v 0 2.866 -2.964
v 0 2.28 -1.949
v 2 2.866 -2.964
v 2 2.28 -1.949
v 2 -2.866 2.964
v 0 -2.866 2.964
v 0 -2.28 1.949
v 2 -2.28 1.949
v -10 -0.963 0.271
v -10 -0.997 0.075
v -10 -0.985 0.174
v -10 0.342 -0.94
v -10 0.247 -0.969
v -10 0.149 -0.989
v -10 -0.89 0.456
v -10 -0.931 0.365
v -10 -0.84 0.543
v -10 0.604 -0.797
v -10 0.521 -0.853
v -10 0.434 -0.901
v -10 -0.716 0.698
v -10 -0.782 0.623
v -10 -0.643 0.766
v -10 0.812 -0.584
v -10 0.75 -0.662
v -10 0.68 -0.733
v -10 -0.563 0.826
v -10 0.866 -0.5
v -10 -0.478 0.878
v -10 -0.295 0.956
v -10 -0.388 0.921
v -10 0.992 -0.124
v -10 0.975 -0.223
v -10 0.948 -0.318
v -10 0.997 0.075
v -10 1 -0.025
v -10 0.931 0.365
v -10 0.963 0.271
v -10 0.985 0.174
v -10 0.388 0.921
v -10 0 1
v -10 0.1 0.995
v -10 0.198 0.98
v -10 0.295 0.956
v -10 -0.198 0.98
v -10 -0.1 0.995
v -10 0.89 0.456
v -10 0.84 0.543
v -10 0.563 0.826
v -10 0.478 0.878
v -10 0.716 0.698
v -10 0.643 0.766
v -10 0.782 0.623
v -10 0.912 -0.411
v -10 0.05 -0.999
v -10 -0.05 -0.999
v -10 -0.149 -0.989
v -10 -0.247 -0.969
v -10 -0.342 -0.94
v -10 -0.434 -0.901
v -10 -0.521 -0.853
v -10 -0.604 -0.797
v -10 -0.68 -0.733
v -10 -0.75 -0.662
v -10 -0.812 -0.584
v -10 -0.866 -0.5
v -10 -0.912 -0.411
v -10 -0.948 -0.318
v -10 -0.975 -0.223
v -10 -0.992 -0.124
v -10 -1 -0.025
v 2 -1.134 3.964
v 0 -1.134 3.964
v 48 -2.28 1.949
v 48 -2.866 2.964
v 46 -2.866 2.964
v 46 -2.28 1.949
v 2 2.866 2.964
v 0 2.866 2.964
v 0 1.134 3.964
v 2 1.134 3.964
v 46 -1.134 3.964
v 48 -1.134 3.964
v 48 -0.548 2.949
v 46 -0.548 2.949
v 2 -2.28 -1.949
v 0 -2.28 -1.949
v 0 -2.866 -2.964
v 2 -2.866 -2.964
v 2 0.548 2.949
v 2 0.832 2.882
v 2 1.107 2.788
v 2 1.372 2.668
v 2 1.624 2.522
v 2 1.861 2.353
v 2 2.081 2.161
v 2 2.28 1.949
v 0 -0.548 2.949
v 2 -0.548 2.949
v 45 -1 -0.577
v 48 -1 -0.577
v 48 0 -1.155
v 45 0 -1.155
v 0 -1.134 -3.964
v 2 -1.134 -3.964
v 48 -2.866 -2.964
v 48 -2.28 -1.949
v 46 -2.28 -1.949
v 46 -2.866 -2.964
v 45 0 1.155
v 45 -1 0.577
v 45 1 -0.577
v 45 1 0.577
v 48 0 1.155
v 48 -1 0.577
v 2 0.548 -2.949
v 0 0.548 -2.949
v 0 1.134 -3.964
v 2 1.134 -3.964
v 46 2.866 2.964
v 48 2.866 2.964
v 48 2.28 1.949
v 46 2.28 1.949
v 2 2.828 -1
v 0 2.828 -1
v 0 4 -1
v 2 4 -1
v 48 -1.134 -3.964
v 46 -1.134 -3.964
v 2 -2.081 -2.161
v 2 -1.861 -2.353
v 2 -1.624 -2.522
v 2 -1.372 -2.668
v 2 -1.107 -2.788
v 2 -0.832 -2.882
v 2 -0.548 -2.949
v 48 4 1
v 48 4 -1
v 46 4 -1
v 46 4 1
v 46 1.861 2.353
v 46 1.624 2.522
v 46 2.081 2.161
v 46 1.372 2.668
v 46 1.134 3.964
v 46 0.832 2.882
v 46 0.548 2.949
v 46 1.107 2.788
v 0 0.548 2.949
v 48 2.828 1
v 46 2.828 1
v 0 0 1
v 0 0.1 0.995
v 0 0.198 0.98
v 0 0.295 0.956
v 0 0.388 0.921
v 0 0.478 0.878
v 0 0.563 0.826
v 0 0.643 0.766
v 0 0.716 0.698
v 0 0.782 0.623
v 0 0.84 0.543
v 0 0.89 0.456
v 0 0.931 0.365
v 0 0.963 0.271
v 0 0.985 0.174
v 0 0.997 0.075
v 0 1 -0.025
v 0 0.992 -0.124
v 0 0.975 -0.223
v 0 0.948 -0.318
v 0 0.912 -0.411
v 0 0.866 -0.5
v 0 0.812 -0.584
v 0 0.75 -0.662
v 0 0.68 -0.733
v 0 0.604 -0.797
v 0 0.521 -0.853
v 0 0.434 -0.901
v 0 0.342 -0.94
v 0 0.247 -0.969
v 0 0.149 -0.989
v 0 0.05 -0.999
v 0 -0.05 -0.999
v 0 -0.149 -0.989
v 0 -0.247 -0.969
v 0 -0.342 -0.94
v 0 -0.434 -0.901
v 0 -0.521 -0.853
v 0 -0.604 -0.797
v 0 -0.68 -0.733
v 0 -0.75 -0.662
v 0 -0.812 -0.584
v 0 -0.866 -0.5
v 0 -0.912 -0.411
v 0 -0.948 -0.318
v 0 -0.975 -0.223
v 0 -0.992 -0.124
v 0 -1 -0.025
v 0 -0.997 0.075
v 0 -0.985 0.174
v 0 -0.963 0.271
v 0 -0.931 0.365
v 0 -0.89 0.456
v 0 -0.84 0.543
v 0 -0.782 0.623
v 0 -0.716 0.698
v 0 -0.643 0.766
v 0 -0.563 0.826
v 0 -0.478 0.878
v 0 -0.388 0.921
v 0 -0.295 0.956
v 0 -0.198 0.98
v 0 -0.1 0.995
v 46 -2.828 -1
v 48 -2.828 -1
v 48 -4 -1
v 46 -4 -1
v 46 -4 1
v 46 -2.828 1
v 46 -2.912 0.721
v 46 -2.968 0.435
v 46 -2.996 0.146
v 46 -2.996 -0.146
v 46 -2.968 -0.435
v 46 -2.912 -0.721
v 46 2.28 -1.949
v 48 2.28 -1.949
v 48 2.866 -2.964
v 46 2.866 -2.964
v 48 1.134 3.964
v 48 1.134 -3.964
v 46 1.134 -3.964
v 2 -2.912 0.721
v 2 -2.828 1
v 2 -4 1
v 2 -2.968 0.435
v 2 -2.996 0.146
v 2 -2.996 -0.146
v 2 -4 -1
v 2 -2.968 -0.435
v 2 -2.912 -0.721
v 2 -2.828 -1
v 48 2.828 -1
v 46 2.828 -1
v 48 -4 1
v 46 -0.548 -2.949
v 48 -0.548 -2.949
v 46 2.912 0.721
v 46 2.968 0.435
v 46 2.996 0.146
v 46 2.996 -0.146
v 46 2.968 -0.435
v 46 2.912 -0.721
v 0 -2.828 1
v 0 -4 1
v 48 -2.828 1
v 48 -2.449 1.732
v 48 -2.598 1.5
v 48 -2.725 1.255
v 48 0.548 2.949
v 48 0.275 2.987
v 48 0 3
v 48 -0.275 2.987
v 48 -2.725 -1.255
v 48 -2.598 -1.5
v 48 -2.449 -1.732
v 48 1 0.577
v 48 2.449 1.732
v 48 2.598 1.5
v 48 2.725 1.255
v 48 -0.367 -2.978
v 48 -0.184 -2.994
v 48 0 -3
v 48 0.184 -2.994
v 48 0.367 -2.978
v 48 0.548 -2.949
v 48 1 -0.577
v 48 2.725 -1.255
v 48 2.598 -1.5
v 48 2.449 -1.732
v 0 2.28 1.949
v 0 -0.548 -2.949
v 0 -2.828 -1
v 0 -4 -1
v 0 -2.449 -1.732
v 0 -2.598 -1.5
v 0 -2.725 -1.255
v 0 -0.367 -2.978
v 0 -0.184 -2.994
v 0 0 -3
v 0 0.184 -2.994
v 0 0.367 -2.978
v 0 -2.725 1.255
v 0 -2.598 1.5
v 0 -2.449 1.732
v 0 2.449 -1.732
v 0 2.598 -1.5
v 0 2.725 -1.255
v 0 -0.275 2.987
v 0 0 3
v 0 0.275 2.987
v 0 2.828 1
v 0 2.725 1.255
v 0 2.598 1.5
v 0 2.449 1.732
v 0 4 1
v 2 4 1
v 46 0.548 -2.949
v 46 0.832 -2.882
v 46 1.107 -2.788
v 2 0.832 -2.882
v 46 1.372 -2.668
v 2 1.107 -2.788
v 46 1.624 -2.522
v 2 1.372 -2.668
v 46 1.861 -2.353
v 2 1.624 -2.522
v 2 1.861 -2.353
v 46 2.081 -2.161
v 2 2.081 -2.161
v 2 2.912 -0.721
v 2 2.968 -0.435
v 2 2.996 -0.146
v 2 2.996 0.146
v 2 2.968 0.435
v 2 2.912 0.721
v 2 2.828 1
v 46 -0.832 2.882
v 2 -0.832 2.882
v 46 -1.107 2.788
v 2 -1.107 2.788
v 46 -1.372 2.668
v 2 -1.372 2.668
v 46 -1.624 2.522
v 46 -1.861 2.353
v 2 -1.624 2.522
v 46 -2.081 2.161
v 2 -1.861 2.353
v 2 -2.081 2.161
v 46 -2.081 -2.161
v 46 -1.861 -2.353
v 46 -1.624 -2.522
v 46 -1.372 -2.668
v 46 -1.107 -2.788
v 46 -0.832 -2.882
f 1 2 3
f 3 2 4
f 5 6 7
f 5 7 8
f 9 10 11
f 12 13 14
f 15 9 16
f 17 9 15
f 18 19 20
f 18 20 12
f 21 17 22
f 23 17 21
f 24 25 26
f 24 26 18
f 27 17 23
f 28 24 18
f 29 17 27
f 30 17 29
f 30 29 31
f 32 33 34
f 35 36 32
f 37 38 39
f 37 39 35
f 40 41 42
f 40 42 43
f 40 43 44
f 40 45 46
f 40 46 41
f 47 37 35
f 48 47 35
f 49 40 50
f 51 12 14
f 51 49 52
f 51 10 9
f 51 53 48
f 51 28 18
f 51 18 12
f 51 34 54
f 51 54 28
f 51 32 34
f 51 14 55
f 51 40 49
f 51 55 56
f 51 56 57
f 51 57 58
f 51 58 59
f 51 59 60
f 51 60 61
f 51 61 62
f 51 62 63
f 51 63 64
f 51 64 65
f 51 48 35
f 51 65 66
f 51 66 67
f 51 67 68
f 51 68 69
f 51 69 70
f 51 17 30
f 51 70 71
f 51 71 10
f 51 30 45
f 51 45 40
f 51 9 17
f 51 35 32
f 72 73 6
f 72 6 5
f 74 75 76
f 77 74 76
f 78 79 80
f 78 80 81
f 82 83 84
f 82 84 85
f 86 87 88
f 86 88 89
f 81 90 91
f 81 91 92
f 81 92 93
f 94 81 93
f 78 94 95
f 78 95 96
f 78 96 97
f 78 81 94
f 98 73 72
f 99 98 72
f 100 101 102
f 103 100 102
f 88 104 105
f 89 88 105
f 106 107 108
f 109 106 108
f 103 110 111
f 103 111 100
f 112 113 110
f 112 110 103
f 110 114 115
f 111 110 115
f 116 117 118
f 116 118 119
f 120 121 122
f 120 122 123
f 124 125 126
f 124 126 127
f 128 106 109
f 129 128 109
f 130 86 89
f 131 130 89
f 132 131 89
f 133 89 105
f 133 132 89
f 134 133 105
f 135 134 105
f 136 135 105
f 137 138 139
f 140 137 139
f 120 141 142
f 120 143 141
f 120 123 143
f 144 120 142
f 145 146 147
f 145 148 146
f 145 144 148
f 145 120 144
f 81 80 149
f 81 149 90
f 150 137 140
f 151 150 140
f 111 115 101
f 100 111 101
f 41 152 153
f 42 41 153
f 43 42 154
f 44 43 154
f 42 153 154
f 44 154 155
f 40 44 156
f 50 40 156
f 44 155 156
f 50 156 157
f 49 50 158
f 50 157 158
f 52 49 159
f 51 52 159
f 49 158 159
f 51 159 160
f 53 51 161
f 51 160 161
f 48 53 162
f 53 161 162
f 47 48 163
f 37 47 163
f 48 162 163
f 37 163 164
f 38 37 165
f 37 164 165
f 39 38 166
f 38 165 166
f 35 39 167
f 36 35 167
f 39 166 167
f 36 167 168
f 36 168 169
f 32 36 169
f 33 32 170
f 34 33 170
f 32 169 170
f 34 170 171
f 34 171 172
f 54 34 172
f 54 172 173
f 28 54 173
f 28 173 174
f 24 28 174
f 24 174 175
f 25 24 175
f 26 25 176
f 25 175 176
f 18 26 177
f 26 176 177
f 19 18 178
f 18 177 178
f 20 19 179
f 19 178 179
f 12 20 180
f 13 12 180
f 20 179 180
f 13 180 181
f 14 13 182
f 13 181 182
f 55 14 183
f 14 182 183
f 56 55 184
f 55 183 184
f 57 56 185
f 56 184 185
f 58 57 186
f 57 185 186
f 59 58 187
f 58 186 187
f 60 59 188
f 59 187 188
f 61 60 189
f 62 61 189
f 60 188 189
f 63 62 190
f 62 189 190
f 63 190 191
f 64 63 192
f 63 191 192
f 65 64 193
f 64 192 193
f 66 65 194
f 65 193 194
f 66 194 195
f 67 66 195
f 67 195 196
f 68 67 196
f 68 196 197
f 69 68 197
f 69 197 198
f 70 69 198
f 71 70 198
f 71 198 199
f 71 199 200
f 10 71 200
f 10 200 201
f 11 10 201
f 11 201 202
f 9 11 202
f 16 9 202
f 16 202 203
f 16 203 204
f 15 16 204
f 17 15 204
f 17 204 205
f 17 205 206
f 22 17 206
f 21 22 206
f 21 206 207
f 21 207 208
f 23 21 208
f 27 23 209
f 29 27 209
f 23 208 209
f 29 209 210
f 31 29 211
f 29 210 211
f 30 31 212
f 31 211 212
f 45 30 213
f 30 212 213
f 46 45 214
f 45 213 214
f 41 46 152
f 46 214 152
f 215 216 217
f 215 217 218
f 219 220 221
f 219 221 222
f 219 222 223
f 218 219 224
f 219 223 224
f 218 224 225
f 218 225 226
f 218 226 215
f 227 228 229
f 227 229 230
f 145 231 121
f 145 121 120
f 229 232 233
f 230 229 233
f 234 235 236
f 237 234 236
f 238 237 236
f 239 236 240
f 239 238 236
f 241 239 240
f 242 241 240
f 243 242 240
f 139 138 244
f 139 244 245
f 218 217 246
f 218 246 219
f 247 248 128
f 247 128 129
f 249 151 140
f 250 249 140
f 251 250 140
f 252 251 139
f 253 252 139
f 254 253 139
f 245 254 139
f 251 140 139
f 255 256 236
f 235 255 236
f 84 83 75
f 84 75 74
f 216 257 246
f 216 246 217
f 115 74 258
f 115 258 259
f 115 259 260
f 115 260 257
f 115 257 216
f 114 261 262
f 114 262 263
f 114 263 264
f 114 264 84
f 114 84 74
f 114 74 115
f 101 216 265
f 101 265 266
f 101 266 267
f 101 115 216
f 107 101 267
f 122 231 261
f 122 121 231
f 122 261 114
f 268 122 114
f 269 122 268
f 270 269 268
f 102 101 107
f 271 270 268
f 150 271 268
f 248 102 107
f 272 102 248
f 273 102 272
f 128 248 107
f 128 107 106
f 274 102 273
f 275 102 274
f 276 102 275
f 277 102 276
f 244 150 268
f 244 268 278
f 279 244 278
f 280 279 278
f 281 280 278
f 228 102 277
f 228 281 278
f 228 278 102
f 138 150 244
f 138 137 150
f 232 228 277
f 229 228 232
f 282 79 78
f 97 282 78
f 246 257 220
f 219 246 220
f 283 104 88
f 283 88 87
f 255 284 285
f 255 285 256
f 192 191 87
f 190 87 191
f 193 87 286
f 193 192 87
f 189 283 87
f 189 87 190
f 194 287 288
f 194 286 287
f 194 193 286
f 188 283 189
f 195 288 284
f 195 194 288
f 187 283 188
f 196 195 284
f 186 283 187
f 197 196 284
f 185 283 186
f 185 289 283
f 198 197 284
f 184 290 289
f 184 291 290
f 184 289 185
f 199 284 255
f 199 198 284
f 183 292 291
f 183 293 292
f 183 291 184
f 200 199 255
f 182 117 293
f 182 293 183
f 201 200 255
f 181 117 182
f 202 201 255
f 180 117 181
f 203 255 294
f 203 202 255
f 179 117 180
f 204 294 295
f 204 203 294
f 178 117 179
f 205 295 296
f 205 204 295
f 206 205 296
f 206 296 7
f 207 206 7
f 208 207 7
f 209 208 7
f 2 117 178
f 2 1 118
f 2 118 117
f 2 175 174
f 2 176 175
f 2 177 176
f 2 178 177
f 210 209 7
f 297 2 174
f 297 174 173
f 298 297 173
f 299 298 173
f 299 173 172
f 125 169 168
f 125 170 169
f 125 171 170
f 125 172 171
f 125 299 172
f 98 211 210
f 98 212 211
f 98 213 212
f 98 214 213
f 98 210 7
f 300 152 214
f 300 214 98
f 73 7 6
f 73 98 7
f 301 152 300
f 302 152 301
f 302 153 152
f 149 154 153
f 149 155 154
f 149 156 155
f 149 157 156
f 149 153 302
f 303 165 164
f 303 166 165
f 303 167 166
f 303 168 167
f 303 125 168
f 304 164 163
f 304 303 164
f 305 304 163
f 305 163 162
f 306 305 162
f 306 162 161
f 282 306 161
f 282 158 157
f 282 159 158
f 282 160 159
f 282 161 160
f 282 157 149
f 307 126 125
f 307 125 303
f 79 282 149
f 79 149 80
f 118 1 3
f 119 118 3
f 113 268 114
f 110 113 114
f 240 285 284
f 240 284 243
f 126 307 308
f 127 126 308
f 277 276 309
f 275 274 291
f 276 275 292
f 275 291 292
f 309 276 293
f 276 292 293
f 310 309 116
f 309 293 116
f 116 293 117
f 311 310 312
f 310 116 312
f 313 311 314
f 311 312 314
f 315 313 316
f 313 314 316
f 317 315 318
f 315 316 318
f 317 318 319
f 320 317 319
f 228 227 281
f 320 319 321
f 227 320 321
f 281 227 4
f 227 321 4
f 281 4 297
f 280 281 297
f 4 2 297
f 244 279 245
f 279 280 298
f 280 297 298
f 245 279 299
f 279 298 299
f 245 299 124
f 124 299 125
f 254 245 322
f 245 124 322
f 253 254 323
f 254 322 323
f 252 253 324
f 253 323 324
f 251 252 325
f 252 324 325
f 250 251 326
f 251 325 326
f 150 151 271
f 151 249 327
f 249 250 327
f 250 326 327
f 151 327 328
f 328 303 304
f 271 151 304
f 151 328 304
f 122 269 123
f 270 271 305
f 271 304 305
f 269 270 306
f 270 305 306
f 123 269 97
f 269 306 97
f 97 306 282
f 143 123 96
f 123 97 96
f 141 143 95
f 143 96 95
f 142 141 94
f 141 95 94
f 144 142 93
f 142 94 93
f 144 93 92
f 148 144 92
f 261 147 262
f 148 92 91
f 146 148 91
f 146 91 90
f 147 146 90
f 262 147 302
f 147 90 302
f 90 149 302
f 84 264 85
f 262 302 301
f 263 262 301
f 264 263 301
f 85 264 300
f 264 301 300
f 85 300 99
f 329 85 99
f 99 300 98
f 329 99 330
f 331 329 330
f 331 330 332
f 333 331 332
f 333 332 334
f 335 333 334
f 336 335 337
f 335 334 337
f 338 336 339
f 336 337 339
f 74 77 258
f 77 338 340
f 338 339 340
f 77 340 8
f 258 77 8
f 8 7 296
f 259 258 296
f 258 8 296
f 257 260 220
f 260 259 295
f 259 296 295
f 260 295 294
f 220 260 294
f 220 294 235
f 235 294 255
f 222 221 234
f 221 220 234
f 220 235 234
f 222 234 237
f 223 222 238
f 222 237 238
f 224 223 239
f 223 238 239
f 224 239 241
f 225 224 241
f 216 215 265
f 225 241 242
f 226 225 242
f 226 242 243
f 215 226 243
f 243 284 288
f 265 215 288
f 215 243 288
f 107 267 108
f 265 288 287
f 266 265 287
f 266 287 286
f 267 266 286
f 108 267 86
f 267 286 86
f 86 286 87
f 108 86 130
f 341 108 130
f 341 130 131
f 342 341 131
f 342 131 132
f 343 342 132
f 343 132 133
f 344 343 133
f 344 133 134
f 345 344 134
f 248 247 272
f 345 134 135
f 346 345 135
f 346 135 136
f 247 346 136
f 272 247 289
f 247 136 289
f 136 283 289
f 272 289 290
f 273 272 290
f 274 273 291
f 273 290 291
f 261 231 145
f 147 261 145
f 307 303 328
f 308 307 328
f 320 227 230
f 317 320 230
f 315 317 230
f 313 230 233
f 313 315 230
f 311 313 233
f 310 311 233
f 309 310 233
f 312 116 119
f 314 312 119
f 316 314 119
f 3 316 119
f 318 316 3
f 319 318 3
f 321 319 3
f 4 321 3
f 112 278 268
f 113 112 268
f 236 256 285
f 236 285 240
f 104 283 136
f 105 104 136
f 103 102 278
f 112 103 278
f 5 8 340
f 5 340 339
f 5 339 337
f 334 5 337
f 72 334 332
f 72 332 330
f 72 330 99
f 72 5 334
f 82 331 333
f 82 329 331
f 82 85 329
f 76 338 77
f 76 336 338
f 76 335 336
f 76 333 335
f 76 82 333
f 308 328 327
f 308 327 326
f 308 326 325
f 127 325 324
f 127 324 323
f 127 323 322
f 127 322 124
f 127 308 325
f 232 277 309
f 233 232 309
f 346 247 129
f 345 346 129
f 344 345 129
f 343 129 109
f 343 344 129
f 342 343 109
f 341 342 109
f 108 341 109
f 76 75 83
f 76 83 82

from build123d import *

# Parameters (mm, degrees)
ESBO_O1_R                 = 3
RESSALTO_EXTRUS_O1_DEPTH  = 48
ESBO_O2_W                 = 4
ESBO_O2_H                 = 2
RESSALTO_EXTRUS_O2_DEPTH  = 4
ESBO_O4_R                 = 4.471241999
CORTE_EXTRUS_O2_DEPTH     = 2
PADR_OCIRCULAR1_COUNT     = 6
ESBO_O7_R                 = 7.725132362
CORTE_EXTRUS_O3_DEPTH     = 2
ESPELHAR5_COPY_1_SKETCH_W = 4
ESPELHAR5_COPY_1_SKETCH_H = 2
ESPELHAR5_COPY_1_DEPTH    = 4
ESPELHAR5_COPY_2_SKETCH_W = 4
ESPELHAR5_COPY_2_SKETCH_H = 2
ESPELHAR5_COPY_2_DEPTH    = 4
ESPELHAR5_COPY_3_SKETCH_W = 4
ESPELHAR5_COPY_3_SKETCH_H = 2
ESPELHAR5_COPY_3_DEPTH    = 4
ESPELHAR5_COPY_4_SKETCH_W = 4
ESPELHAR5_COPY_4_SKETCH_H = 2
ESPELHAR5_COPY_4_DEPTH    = 4
ESPELHAR5_COPY_5_SKETCH_W = 4
ESPELHAR5_COPY_5_SKETCH_H = 2
ESPELHAR5_COPY_5_DEPTH    = 4
ESBO_O10_R                = 7.180900458
CORTE_EXTRUS_O5_DEPTH     = 2
ESBO_O11_R                = 1
RESSALTO_EXTRUS_O3_DEPTH  = 10
CORTE_EXTRUS_O6_DEPTH     = 3


with BuildPart() as part:
    # Esboço1 → Ressalto-extrusão1 (new body)
    with BuildSketch(Plane(origin=(0, 0, 0), x_dir=(0, 0, -1), z_dir=(1, 0, 0))):
        Circle(ESBO_O1_R)
    ressalto_extrus_o1 = extrude(amount=RESSALTO_EXTRUS_O1_DEPTH)

    # Esboço2 → Ressalto-extrusão2 (add, symmetric)
    with BuildSketch(Plane(origin=(0, 0, 0), x_dir=(1, 0, 0), z_dir=(0, 1, 0))):
        Rectangle(ESBO_O2_W, ESBO_O2_H)
    ressalto_extrus_o2 = extrude(amount=RESSALTO_EXTRUS_O2_DEPTH, both=True)

    # Esboço4 → Corte-extrusão2 (cut)
    with BuildSketch(Plane.ZY.offset(2)):
        Circle(ESBO_O4_R)
    extrude(amount=-CORTE_EXTRUS_O2_DEPTH, mode=Mode.SUBTRACT)

    # PadrãoCircular1: Ressalto-extrusão2 ×6 about axis
    padr_ocircular1_axis = Axis((0, 0, 0), (1, 0, 0))
    for i in range(1, PADR_OCIRCULAR1_COUNT):
        add(ressalto_extrus_o2.rotate(padr_ocircular1_axis, i * 360 / PADR_OCIRCULAR1_COUNT))

    # Esboço7 → Corte-extrusão3 (cut)
    with BuildSketch(Plane.ZY.offset(2)):
        Circle(ESBO_O7_R)
    extrude(amount=-CORTE_EXTRUS_O3_DEPTH, mode=Mode.SUBTRACT)

    # Espelhar5: Ressalto-extrusão1, Ressalto-extrusão2 across plane
    add(ressalto_extrus_o1.mirror(Plane(origin=(24, 0, 0), x_dir=(0, 0, 1), z_dir=(1, 0, 0))))
    add(ressalto_extrus_o2.mirror(Plane(origin=(24, 0, 0), x_dir=(0, 0, 1), z_dir=(1, 0, 0))))

    # Espelhar5 copy 1 sketch → Espelhar5 copy 1 (add, symmetric)
    with BuildSketch(Plane(origin=(48, 0, 0), x_dir=(-1, 0, 0), z_dir=(0, 0.5, 0.866025404))):
        Rectangle(ESPELHAR5_COPY_1_SKETCH_W, ESPELHAR5_COPY_1_SKETCH_H)
    extrude(amount=ESPELHAR5_COPY_1_DEPTH, both=True)

    # Espelhar5 copy 2 sketch → Espelhar5 copy 2 (add, symmetric)
    with BuildSketch(Plane(origin=(48, 0, 0), x_dir=(-1, 0, 0), z_dir=(0, -0.5, 0.866025404))):
        Rectangle(ESPELHAR5_COPY_2_SKETCH_W, ESPELHAR5_COPY_2_SKETCH_H)
    extrude(amount=ESPELHAR5_COPY_2_DEPTH, both=True)

    # Espelhar5 copy 3 sketch → Espelhar5 copy 3 (add, symmetric)
    with BuildSketch(Plane(origin=(48, 0, 0), x_dir=(-1, 0, 0), z_dir=(0, -1, 0))):
        Rectangle(ESPELHAR5_COPY_3_SKETCH_W, ESPELHAR5_COPY_3_SKETCH_H)
    extrude(amount=ESPELHAR5_COPY_3_DEPTH, both=True)

    # Espelhar5 copy 4 sketch → Espelhar5 copy 4 (add, symmetric)
    with BuildSketch(Plane(origin=(48, 0, 0), x_dir=(-1, 0, 0), z_dir=(0, -0.5, -0.866025404))):
        Rectangle(ESPELHAR5_COPY_4_SKETCH_W, ESPELHAR5_COPY_4_SKETCH_H)
    extrude(amount=ESPELHAR5_COPY_4_DEPTH, both=True)

    # Espelhar5 copy 5 sketch → Espelhar5 copy 5 (add, symmetric)
    with BuildSketch(Plane(origin=(48, 0, 0), x_dir=(-1, 0, 0), z_dir=(0, 0.5, -0.866025404))):
        Rectangle(ESPELHAR5_COPY_5_SKETCH_W, ESPELHAR5_COPY_5_SKETCH_H)
    extrude(amount=ESPELHAR5_COPY_5_DEPTH, both=True)

    # Esboço10 → Corte-extrusão5 (cut)
    with BuildSketch(Plane(origin=(50, 0, 0), x_dir=(0, 0, -1), z_dir=(1, 0, 0))):
        Circle(ESBO_O10_R)
    extrude(amount=-CORTE_EXTRUS_O5_DEPTH, mode=Mode.SUBTRACT)

    # Esboço11 → Ressalto-extrusão3 (add)
    with BuildSketch(Plane.ZY):
        Circle(ESBO_O11_R)
    extrude(amount=RESSALTO_EXTRUS_O3_DEPTH)

    # Esboço12 → Corte-extrusão6 (cut)
    with BuildSketch(Plane(origin=(48, 0, 0), x_dir=(0, 0, -1), z_dir=(1, 0, 0))):
        Polygon((-0.577350269, 1), (-1.154700538, 0), (-0.577350269, -1), (0.577350269, -1), (1.154700538, 0), (0.577350269, 1), align=None)
    extrude(amount=-CORTE_EXTRUS_O6_DEPTH, mode=Mode.SUBTRACT)


solid = part.part
